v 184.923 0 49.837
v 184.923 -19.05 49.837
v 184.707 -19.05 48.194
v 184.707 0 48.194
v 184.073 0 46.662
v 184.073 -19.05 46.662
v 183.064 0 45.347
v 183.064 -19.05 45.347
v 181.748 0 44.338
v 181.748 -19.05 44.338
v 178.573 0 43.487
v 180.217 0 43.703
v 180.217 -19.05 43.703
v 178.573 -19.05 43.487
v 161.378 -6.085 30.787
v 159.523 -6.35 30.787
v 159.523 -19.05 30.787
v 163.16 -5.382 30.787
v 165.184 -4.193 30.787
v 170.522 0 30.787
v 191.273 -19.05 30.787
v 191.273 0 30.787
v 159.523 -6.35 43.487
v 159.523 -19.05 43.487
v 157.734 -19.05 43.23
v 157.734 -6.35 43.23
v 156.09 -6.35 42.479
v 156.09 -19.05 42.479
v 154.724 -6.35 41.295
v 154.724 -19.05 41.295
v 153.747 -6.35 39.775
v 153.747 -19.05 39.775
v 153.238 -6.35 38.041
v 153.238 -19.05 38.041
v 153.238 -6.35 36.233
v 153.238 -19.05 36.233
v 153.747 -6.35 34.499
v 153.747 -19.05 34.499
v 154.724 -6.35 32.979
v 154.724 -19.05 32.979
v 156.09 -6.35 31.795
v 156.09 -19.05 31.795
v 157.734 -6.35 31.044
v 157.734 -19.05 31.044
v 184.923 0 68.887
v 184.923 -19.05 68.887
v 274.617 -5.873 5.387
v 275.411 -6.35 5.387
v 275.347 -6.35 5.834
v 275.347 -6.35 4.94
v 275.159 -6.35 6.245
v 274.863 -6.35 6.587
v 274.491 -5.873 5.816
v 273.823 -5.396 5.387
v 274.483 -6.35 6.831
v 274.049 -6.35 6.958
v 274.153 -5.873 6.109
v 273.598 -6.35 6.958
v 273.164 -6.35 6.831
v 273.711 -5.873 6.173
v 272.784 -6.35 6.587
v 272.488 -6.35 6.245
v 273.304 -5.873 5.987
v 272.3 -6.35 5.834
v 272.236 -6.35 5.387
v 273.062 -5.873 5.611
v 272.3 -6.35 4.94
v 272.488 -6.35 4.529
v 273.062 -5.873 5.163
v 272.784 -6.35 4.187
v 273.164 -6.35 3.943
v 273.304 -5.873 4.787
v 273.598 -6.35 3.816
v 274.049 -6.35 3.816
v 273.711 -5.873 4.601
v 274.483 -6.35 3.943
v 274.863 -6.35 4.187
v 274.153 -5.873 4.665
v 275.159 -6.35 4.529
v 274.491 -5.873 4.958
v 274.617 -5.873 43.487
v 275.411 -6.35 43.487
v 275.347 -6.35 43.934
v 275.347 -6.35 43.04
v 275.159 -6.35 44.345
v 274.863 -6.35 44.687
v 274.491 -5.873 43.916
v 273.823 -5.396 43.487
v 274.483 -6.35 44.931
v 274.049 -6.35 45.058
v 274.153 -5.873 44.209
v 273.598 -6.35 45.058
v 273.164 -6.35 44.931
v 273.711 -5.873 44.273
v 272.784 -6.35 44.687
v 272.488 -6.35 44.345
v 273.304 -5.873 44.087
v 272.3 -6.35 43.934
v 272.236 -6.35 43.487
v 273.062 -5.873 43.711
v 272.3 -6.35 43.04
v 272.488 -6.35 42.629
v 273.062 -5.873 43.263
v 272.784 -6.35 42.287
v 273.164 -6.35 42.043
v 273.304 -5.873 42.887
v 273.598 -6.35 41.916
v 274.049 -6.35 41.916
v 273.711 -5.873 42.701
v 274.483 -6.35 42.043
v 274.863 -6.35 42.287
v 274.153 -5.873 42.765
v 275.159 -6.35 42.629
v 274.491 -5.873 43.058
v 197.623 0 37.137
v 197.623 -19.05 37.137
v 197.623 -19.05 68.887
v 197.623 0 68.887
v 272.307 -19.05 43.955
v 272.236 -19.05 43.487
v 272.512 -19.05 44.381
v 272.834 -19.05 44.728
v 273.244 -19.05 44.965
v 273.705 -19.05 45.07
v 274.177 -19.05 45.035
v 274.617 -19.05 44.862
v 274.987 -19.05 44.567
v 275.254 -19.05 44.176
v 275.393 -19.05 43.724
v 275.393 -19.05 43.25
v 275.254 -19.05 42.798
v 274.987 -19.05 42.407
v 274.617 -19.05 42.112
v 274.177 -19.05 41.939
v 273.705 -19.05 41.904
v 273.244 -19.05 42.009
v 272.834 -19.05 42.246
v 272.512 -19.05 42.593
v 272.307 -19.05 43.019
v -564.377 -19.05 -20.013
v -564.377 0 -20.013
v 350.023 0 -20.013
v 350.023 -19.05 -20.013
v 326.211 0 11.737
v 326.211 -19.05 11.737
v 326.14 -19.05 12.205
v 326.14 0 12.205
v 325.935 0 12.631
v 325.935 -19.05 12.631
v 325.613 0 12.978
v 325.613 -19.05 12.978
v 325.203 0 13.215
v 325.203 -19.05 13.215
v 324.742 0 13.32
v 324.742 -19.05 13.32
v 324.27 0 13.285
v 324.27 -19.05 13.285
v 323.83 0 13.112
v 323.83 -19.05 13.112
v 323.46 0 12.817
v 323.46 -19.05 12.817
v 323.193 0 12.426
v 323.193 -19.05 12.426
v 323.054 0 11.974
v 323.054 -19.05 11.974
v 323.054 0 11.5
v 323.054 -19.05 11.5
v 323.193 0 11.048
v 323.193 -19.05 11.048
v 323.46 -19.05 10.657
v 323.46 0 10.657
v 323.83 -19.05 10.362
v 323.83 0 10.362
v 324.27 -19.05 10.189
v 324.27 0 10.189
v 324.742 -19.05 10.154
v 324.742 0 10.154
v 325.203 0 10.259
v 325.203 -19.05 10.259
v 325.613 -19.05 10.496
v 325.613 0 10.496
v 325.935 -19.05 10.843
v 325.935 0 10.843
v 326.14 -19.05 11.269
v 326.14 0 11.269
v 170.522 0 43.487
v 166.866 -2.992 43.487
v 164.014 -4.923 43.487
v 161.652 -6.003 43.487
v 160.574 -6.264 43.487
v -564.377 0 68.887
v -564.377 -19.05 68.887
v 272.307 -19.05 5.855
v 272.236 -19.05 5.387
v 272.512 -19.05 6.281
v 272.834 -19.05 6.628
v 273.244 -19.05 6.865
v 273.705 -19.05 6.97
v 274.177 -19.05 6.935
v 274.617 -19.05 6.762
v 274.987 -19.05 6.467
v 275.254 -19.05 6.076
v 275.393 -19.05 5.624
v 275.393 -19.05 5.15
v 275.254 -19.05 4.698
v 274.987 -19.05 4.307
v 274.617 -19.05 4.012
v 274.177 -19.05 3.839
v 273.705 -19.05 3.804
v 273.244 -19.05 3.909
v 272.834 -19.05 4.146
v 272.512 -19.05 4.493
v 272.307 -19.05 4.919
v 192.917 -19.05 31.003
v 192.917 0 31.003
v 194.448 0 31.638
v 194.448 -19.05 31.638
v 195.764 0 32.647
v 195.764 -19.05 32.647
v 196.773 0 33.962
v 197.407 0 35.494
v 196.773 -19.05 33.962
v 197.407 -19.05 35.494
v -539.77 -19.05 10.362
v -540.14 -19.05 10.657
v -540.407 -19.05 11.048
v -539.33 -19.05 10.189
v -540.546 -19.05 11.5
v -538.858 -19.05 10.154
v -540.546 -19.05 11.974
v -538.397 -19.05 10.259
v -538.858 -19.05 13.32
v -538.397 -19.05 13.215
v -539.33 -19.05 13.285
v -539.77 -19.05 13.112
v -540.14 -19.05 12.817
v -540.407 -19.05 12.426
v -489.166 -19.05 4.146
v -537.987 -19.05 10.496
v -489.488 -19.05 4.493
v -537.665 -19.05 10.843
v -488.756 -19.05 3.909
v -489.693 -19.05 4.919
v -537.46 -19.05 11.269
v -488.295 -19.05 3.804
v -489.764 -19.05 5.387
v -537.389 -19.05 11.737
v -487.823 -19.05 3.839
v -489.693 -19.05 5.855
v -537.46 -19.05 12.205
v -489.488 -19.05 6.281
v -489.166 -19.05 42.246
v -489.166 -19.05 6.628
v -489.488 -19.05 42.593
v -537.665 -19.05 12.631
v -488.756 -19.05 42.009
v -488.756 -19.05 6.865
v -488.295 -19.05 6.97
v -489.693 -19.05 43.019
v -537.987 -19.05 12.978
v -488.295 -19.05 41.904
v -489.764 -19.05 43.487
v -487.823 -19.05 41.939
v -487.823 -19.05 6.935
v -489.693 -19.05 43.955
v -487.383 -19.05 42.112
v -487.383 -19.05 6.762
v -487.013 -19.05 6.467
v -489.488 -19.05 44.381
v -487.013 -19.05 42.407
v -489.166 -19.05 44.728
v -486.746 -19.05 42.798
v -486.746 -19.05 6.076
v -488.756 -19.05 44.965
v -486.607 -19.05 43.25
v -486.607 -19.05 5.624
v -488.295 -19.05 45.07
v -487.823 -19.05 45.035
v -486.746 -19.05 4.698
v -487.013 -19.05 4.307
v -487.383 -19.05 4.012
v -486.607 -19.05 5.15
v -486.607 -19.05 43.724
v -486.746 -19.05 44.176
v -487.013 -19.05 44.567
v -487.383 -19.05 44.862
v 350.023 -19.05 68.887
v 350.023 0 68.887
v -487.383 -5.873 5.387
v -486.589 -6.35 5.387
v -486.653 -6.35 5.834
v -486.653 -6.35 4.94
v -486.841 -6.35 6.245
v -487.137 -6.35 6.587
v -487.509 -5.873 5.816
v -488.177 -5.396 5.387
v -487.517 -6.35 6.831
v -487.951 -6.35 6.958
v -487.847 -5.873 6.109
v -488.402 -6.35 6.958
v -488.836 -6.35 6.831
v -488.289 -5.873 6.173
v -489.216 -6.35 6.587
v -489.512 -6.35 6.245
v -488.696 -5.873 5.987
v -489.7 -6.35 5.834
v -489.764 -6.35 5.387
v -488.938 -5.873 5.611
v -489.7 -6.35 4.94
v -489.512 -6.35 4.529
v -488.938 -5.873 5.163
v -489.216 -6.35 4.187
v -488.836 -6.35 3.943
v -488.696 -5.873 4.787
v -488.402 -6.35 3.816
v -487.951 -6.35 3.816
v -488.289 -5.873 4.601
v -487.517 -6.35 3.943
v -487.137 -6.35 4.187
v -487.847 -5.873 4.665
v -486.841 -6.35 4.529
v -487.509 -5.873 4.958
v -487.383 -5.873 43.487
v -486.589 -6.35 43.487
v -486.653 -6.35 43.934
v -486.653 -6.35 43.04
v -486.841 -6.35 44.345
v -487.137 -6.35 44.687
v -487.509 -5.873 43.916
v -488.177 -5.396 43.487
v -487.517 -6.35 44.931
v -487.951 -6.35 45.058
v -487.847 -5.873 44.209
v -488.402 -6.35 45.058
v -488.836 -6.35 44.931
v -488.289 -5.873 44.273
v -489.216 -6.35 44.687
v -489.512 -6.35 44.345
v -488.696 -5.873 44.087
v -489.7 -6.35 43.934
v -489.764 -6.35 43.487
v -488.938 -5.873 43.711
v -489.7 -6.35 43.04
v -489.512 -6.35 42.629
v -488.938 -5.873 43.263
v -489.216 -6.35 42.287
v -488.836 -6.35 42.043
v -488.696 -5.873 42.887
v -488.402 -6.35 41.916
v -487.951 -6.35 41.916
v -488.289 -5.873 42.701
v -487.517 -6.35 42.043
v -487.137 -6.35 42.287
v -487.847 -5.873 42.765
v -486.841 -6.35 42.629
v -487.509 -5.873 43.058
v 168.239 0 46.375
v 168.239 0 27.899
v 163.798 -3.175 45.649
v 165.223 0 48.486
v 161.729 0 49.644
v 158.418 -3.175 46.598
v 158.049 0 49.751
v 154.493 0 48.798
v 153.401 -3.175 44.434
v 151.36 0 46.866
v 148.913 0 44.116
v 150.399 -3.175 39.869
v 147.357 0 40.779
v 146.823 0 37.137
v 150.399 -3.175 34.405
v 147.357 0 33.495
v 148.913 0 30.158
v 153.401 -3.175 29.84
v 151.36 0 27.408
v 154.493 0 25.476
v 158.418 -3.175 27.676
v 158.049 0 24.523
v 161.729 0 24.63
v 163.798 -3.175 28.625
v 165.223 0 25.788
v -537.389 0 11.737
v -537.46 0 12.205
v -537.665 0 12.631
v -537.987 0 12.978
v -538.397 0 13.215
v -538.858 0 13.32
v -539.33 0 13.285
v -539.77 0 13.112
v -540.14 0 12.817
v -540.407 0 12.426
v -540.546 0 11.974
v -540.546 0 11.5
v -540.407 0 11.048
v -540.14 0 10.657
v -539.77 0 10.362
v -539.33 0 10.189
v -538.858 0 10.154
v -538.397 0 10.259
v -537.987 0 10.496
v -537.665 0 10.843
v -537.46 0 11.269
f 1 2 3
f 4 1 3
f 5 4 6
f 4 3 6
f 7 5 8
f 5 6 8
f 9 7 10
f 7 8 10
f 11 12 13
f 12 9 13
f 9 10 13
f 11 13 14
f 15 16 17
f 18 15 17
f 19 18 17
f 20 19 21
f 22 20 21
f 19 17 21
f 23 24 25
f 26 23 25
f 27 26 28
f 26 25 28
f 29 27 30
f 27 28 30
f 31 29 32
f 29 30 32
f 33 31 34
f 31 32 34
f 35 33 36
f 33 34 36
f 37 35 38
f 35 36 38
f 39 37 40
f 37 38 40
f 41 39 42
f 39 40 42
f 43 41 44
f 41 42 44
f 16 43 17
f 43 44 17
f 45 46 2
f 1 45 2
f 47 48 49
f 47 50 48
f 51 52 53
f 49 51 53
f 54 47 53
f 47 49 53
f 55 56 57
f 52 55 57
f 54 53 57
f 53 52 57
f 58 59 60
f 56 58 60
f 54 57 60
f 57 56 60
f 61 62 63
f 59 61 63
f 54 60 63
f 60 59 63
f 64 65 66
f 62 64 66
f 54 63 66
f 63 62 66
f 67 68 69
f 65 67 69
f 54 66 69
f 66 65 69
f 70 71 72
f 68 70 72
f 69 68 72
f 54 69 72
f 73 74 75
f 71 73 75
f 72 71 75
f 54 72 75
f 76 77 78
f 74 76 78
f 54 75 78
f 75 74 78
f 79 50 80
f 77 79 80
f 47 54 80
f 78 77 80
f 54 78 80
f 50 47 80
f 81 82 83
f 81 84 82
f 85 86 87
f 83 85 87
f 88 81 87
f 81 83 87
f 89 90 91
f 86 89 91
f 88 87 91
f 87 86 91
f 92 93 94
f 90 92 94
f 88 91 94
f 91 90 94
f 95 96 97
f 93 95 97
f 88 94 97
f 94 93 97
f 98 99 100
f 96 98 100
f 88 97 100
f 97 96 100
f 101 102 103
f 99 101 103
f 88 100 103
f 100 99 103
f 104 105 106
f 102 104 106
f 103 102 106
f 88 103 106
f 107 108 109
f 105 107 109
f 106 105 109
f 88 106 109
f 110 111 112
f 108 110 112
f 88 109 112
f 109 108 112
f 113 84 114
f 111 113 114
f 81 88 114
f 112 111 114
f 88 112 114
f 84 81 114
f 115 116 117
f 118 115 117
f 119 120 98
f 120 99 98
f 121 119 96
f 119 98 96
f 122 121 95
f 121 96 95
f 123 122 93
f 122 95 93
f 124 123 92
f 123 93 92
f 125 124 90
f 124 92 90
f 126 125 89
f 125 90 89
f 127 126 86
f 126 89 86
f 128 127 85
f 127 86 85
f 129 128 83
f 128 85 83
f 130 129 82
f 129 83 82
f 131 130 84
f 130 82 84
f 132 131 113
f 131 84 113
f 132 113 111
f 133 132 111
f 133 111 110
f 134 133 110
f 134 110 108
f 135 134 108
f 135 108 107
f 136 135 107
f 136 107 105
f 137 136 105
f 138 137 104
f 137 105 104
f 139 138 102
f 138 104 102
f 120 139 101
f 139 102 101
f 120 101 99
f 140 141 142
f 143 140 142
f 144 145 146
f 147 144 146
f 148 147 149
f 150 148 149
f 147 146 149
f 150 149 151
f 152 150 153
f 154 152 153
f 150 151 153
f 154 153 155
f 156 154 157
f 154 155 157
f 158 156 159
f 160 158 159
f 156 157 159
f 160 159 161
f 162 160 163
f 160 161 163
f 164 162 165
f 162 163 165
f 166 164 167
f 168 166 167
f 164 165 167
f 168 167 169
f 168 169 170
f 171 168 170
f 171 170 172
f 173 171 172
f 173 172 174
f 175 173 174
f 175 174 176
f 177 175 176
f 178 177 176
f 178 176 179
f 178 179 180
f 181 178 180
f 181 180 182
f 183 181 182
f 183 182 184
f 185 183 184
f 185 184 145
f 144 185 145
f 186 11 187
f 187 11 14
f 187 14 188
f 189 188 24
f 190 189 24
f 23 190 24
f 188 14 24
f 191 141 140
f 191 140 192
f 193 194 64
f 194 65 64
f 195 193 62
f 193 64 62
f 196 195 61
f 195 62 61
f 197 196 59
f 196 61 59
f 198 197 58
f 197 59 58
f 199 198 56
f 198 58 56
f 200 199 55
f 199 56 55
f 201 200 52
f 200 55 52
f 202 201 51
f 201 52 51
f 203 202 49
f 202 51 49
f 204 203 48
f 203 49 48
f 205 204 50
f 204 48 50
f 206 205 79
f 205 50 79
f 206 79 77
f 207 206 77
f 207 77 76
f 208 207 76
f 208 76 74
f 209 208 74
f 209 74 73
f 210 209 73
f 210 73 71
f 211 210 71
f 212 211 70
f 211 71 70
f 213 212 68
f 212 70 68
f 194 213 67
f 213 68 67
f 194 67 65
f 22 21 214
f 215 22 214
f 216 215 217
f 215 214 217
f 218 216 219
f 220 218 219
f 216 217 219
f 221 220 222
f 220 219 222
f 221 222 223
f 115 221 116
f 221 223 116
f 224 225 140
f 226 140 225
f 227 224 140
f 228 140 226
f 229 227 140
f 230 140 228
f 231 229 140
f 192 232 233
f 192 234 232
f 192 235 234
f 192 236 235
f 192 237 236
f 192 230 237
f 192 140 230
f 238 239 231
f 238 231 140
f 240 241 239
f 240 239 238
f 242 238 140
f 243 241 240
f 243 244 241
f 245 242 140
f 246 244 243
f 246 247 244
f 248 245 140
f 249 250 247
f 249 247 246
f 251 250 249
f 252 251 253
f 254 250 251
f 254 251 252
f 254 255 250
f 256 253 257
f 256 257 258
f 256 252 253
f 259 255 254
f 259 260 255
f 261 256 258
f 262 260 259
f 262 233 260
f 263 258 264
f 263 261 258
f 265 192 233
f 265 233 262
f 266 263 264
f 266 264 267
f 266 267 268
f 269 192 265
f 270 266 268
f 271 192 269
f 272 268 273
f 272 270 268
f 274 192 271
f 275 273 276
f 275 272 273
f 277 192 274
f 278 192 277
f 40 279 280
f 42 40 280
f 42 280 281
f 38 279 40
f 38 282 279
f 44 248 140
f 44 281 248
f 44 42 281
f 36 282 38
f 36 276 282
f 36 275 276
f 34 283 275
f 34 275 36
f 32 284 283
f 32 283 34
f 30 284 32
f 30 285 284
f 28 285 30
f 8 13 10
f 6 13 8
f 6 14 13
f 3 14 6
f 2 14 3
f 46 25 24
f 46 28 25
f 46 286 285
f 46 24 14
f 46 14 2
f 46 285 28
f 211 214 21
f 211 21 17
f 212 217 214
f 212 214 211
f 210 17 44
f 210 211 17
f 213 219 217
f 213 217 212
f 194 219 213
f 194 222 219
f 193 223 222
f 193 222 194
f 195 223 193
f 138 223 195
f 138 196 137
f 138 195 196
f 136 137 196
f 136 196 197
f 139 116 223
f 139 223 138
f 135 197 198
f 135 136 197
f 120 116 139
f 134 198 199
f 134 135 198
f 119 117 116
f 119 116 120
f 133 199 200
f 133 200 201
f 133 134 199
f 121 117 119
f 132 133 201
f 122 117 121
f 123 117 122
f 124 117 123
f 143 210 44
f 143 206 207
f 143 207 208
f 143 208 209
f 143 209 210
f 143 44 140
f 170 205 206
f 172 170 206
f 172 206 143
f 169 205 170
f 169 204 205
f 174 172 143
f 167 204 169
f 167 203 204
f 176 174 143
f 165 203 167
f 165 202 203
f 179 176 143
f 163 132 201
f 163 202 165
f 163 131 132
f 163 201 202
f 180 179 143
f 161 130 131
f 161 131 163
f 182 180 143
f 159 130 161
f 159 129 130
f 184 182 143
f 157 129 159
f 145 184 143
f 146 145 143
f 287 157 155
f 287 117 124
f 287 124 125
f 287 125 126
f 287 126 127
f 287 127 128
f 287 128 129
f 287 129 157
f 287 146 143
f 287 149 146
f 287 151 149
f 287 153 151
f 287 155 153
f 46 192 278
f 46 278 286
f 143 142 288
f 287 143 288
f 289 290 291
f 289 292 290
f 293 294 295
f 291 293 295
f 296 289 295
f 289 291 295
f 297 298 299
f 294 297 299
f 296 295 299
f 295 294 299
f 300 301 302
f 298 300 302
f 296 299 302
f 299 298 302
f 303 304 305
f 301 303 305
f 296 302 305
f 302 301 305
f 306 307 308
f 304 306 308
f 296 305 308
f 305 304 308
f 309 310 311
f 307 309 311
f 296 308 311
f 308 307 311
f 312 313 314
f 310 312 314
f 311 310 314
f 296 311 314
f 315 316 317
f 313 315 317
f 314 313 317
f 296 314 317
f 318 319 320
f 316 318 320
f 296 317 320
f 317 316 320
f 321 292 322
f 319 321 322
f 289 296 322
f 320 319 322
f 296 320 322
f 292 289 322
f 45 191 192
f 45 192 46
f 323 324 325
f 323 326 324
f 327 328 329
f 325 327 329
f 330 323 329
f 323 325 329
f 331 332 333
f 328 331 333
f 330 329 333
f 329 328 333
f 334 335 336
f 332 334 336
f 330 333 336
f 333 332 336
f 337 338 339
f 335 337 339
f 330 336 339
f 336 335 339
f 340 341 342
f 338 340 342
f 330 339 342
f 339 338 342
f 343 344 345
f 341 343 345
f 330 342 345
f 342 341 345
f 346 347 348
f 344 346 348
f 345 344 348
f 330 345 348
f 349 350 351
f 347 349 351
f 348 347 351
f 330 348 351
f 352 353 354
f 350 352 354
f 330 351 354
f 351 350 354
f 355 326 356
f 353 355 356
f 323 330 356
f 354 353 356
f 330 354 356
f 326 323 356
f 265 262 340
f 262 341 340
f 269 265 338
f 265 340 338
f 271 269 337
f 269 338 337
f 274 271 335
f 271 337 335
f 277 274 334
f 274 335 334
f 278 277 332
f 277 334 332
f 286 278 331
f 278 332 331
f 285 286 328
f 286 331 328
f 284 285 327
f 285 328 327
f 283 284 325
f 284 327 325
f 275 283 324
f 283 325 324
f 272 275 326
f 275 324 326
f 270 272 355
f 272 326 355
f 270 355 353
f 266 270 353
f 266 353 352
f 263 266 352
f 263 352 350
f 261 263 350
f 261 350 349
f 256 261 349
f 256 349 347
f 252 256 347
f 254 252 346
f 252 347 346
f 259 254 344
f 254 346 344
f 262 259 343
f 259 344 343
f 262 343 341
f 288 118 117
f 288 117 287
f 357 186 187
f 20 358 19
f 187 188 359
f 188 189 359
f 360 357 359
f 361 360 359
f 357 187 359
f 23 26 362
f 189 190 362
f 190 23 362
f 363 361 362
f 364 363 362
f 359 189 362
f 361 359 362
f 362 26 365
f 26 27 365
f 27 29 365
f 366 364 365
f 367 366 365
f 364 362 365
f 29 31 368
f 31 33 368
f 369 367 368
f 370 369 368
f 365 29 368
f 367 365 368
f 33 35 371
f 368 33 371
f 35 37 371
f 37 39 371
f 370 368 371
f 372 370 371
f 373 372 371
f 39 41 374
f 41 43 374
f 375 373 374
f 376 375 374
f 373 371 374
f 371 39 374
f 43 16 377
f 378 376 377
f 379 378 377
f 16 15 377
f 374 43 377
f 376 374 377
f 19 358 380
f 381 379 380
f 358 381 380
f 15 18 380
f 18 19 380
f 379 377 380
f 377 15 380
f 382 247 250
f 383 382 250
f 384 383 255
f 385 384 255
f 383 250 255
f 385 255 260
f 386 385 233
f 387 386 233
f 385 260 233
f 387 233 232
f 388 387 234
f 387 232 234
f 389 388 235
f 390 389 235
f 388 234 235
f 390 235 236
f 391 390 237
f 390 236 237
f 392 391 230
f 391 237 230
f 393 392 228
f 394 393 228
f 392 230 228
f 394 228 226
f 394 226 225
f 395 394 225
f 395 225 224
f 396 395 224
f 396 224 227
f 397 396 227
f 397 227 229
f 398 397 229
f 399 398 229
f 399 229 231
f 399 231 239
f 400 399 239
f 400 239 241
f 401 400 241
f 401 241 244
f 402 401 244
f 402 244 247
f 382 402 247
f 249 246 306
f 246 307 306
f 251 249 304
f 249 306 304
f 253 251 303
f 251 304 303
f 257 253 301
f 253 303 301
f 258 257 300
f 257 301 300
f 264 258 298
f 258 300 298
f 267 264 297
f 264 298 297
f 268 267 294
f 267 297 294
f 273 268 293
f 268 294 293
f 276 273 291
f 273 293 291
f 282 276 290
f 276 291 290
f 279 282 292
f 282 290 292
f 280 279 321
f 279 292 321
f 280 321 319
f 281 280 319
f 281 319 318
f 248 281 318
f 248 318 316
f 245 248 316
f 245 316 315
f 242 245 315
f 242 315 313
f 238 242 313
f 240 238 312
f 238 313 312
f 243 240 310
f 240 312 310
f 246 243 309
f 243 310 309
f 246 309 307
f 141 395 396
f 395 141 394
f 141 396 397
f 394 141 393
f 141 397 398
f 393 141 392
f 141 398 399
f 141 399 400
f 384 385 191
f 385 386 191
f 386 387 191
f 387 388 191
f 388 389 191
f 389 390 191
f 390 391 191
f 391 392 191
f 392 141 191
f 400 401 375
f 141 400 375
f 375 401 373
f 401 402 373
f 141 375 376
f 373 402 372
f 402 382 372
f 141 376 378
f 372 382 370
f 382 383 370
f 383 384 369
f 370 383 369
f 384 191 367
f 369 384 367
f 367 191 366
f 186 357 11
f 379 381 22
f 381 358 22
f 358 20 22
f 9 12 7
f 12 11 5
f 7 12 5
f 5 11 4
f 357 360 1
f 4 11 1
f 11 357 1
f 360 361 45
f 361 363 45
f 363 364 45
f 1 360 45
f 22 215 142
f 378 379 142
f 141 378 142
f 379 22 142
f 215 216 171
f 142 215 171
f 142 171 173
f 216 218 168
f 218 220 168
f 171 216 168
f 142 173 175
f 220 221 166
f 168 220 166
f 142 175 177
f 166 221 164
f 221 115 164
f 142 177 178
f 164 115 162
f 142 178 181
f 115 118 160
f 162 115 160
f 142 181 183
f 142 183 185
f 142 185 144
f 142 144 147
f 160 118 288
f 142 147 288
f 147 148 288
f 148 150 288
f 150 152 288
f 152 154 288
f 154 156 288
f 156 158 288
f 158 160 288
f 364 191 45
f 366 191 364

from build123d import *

# Parameters (mm, degrees)
F0_W           = 914.4
F0_H           = 88.9
F1_DEPTH       = 19.05
F3_D           = 3.175
F3_DEPTH       = 12.7
F3_TIP         = 0.9538662327
F4_DEPTH       = 19.051
F6_D           = 3.175
F8_D           = 12.7
F8_CSINK_D     = 25.4
F8_CSINK_ANGLE = 90


with BuildPart() as f1:
    # F0 (on Front) → F1 (new body)
    with BuildSketch(Plane.XZ):
        with Locations((-107.1765102817, 24.4370475411)):
            Rectangle(F0_W, F0_H)
    extrude(amount=F1_DEPTH)

    # F3
    with Locations(Plane.XZ.offset(19.05)):
        with Locations((273.8234897183, 43.4870475411), (273.8234897183, 5.3870475411), (-488.1765102817, 43.4870475411), (-488.1765102817, 5.3870475411)):
            Hole(F3_D / 2, depth=F3_DEPTH)
            with Locations((0, 0, -(F3_DEPTH + F3_TIP / 2))):  # 118° drill point
                Cone(0, F3_D / 2, F3_TIP, mode=Mode.SUBTRACT)

    # F2 (on face) → F4 (cut, through all)
    with BuildSketch(Plane.XZ.offset(19.05)):
        with BuildLine():
            Line((197.6234897183, 37.1370475411), (197.6234897183, 68.8870475411))
            Line((197.6234897183, 68.8870475411), (184.9234897183, 68.8870475411))
            Line((184.9234897183, 68.8870475411), (184.9234897183, 49.8370475411))
            ThreePointArc((184.9234897183, 49.8370475411), (183.0636177789, 45.3469194806), (178.5734897183, 43.4870475411))
            Line((178.5734897183, 43.4870475411), (159.5234897183, 43.4870475411))
            ThreePointArc((159.5234897183, 43.4870475411), (164.0136177789, 41.6271756017), (165.8734897183, 37.1370475411))
            ThreePointArc((165.8734897183, 37.1370475411), (164.0136177789, 32.6469194806), (159.5234897183, 30.7870475411))
            Line((159.5234897183, 30.7870475411), (191.2734897183, 30.7870475411))
            ThreePointArc((191.2734897183, 30.7870475411), (195.7636177789, 32.6469194806), (197.6234897183, 37.1370475411))
        make_face()
    extrude(amount=-F4_DEPTH, mode=Mode.SUBTRACT)

    # F6 (through all)
    with Locations(Plane(origin=(0, 0, 0), x_dir=(-1, 0, 0), z_dir=(0, 1, 0))):
        with Locations((-324.6234897183, 11.7370475411), (538.9765102817, 11.7370475411)):
            Hole(F6_D / 2)

    # F8 (through all)
    with Locations(Plane(origin=(0, 0, 0), x_dir=(-1, 0, 0), z_dir=(0, 1, 0))):
        with Locations((-159.5234897183, 37.1370475411)):
            CounterSinkHole(F8_D / 2, F8_CSINK_D / 2, counter_sink_angle=F8_CSINK_ANGLE)


solid = f1.part
